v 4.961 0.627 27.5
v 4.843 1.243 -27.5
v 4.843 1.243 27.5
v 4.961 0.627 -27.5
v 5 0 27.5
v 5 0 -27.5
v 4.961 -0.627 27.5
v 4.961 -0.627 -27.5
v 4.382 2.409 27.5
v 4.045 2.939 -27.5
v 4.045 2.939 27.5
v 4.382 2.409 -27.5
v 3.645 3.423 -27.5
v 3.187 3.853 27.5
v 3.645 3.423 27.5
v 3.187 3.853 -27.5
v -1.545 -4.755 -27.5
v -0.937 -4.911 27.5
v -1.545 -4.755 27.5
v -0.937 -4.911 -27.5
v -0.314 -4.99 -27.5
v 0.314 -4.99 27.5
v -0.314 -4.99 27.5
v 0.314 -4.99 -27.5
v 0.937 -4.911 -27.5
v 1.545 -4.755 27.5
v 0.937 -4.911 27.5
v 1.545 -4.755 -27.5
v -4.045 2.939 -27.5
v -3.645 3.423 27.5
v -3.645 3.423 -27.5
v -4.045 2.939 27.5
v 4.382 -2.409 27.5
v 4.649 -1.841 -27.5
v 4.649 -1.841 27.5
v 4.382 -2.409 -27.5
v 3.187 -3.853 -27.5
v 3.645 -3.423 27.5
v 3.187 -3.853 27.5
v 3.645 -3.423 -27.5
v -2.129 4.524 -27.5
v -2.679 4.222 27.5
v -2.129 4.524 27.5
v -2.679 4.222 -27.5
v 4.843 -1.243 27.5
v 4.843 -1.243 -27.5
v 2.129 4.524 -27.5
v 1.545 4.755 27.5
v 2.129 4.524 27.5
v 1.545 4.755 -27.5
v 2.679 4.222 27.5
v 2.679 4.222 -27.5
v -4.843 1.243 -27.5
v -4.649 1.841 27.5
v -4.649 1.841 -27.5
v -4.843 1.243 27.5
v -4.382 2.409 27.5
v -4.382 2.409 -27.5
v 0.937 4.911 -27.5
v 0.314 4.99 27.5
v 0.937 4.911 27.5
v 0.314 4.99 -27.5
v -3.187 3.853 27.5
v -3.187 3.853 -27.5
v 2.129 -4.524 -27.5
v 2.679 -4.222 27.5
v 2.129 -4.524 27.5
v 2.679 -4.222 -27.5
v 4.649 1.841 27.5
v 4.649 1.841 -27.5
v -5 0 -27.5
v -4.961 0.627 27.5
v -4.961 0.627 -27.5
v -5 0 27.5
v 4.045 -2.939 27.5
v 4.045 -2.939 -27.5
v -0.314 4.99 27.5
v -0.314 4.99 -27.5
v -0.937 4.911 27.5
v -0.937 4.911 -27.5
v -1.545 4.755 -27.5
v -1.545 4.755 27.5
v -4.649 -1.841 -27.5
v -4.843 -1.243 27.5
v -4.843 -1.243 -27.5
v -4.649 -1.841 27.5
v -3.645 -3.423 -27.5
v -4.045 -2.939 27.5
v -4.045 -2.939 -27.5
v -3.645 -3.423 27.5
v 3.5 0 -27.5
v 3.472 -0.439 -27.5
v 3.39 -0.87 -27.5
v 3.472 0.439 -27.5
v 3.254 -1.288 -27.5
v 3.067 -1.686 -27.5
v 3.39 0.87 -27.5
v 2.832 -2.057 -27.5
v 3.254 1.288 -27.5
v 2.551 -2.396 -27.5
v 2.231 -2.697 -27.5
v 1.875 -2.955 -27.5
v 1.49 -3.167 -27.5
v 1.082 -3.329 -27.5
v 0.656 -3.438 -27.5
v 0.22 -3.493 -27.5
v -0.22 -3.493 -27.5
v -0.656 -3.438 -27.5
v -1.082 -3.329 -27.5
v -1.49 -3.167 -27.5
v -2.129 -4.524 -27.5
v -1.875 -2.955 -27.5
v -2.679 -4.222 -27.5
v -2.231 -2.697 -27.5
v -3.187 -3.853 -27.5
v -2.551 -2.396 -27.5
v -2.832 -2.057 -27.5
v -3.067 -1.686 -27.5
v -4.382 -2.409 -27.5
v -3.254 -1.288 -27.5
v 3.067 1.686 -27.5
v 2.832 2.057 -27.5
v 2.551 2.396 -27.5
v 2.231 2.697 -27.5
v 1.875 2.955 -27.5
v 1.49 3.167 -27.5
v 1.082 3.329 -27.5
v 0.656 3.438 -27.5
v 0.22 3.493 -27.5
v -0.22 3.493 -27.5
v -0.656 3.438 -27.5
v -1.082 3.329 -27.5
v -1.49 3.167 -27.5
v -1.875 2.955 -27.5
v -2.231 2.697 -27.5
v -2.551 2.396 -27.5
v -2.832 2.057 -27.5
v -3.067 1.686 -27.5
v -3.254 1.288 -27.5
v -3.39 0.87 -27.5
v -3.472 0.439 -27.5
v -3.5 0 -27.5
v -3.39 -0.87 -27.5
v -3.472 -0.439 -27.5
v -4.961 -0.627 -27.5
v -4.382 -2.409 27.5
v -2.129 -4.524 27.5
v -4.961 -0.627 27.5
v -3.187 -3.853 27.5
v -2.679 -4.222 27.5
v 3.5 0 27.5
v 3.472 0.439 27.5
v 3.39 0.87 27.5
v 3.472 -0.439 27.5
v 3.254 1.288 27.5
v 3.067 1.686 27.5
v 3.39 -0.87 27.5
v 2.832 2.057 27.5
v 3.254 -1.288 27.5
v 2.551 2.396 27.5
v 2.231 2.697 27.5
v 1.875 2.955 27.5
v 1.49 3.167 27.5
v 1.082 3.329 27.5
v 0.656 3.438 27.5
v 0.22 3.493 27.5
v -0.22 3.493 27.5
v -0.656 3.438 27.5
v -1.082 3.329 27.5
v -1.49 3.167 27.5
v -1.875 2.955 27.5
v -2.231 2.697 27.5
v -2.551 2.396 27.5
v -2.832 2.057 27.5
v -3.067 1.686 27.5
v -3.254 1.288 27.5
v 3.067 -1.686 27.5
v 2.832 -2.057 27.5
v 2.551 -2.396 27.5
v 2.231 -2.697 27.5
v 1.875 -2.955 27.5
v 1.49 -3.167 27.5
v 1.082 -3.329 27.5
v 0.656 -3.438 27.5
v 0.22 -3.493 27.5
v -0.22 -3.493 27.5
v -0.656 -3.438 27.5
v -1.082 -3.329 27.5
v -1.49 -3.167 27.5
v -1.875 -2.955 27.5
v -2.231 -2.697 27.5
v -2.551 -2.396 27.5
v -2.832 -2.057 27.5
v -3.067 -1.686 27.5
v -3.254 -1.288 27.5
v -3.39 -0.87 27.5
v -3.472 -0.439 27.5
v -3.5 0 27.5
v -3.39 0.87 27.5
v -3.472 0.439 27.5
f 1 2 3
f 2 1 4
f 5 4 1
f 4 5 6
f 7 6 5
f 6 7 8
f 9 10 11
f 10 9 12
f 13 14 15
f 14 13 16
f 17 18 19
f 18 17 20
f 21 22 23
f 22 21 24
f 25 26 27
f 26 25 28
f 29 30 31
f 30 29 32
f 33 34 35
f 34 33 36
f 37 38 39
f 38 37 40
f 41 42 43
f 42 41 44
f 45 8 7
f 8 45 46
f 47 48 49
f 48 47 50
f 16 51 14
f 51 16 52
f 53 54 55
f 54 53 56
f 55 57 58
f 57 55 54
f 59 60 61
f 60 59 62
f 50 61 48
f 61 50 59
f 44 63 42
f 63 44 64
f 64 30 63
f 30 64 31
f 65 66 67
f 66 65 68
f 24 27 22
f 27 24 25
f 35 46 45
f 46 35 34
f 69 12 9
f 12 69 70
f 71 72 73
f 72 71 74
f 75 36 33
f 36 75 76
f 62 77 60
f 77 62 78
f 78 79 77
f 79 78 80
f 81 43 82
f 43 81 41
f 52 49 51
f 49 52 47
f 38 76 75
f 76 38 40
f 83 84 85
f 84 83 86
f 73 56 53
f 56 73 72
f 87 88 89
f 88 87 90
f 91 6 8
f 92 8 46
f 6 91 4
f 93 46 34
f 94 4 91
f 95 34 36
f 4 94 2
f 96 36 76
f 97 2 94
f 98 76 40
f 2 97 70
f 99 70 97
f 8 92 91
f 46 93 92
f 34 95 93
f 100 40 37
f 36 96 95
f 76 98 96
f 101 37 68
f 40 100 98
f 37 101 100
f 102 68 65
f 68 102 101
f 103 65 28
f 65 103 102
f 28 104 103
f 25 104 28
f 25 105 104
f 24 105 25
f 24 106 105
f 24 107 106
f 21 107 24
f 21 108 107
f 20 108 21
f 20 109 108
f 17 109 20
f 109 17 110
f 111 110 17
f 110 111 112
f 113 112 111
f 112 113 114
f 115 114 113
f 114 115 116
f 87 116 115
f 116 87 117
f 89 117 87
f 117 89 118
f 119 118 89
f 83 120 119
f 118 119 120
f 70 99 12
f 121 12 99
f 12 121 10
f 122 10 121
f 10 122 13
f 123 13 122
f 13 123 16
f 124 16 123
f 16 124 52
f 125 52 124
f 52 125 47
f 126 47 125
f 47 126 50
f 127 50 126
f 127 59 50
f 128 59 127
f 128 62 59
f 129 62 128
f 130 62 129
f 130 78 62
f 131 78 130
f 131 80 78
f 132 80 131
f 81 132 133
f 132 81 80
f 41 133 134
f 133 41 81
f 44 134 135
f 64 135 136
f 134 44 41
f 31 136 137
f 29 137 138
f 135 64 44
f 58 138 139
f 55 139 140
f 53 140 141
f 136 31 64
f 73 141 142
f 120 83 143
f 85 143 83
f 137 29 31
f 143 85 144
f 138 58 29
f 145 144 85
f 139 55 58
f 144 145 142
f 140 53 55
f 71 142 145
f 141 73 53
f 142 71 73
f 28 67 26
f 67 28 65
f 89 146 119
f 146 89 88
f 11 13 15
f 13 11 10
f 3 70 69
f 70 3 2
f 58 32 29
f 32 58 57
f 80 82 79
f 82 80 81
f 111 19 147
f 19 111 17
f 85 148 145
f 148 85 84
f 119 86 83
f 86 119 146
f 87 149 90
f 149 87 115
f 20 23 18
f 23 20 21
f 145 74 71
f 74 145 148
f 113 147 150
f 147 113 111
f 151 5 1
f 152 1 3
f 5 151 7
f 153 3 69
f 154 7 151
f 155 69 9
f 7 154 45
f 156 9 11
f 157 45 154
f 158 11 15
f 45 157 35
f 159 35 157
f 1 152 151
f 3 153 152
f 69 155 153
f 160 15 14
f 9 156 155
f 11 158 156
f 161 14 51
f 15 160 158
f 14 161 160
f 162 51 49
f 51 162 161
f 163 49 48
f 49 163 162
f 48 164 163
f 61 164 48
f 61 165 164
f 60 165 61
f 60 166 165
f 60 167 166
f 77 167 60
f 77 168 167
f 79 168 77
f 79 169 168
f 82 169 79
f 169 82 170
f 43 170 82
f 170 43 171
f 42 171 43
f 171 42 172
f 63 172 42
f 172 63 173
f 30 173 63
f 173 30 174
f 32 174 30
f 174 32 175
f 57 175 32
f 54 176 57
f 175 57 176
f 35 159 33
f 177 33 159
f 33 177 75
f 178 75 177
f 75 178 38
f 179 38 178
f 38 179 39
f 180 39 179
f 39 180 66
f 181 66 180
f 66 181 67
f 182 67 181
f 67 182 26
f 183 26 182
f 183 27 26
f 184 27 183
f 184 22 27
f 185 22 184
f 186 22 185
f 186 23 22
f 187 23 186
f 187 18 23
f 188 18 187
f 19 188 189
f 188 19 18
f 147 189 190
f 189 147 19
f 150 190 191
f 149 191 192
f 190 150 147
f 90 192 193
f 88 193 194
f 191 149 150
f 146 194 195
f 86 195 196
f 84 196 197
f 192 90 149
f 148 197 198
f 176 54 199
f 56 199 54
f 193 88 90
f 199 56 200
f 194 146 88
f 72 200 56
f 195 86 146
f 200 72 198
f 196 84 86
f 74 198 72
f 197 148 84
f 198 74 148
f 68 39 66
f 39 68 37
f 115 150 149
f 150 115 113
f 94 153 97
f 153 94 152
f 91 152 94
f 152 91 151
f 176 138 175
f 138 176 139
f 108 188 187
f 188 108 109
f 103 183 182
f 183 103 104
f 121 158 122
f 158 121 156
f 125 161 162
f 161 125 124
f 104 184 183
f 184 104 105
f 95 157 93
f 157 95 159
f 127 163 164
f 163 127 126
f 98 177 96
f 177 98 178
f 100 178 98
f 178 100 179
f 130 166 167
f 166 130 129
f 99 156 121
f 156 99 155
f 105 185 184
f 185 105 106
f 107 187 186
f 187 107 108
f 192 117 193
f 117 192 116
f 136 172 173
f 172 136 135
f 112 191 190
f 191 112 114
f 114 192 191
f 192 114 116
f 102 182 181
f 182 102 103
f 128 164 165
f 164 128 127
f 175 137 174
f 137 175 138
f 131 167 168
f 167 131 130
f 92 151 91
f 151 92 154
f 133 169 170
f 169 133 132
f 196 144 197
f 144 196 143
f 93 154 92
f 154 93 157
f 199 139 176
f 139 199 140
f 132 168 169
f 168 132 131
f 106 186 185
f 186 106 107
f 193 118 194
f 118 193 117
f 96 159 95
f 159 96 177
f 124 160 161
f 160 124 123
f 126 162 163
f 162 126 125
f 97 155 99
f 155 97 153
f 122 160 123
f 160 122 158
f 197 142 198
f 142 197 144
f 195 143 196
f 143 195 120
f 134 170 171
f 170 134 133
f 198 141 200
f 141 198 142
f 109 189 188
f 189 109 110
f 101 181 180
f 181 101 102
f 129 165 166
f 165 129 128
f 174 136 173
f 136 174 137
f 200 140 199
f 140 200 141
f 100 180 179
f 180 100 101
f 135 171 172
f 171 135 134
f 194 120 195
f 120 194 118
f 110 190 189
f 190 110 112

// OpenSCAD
$fn = 50;


difference() {
	union() {
		translate(v = [0, 0, -27.5000000000]) {
			cylinder(h = 55, r = 5.0000000000);
		}
	}
	union() {
		translate(v = [0, 0, -100.0000000000]) {
			cylinder(h = 200, r = 3.5000000000);
		}
	}
}
